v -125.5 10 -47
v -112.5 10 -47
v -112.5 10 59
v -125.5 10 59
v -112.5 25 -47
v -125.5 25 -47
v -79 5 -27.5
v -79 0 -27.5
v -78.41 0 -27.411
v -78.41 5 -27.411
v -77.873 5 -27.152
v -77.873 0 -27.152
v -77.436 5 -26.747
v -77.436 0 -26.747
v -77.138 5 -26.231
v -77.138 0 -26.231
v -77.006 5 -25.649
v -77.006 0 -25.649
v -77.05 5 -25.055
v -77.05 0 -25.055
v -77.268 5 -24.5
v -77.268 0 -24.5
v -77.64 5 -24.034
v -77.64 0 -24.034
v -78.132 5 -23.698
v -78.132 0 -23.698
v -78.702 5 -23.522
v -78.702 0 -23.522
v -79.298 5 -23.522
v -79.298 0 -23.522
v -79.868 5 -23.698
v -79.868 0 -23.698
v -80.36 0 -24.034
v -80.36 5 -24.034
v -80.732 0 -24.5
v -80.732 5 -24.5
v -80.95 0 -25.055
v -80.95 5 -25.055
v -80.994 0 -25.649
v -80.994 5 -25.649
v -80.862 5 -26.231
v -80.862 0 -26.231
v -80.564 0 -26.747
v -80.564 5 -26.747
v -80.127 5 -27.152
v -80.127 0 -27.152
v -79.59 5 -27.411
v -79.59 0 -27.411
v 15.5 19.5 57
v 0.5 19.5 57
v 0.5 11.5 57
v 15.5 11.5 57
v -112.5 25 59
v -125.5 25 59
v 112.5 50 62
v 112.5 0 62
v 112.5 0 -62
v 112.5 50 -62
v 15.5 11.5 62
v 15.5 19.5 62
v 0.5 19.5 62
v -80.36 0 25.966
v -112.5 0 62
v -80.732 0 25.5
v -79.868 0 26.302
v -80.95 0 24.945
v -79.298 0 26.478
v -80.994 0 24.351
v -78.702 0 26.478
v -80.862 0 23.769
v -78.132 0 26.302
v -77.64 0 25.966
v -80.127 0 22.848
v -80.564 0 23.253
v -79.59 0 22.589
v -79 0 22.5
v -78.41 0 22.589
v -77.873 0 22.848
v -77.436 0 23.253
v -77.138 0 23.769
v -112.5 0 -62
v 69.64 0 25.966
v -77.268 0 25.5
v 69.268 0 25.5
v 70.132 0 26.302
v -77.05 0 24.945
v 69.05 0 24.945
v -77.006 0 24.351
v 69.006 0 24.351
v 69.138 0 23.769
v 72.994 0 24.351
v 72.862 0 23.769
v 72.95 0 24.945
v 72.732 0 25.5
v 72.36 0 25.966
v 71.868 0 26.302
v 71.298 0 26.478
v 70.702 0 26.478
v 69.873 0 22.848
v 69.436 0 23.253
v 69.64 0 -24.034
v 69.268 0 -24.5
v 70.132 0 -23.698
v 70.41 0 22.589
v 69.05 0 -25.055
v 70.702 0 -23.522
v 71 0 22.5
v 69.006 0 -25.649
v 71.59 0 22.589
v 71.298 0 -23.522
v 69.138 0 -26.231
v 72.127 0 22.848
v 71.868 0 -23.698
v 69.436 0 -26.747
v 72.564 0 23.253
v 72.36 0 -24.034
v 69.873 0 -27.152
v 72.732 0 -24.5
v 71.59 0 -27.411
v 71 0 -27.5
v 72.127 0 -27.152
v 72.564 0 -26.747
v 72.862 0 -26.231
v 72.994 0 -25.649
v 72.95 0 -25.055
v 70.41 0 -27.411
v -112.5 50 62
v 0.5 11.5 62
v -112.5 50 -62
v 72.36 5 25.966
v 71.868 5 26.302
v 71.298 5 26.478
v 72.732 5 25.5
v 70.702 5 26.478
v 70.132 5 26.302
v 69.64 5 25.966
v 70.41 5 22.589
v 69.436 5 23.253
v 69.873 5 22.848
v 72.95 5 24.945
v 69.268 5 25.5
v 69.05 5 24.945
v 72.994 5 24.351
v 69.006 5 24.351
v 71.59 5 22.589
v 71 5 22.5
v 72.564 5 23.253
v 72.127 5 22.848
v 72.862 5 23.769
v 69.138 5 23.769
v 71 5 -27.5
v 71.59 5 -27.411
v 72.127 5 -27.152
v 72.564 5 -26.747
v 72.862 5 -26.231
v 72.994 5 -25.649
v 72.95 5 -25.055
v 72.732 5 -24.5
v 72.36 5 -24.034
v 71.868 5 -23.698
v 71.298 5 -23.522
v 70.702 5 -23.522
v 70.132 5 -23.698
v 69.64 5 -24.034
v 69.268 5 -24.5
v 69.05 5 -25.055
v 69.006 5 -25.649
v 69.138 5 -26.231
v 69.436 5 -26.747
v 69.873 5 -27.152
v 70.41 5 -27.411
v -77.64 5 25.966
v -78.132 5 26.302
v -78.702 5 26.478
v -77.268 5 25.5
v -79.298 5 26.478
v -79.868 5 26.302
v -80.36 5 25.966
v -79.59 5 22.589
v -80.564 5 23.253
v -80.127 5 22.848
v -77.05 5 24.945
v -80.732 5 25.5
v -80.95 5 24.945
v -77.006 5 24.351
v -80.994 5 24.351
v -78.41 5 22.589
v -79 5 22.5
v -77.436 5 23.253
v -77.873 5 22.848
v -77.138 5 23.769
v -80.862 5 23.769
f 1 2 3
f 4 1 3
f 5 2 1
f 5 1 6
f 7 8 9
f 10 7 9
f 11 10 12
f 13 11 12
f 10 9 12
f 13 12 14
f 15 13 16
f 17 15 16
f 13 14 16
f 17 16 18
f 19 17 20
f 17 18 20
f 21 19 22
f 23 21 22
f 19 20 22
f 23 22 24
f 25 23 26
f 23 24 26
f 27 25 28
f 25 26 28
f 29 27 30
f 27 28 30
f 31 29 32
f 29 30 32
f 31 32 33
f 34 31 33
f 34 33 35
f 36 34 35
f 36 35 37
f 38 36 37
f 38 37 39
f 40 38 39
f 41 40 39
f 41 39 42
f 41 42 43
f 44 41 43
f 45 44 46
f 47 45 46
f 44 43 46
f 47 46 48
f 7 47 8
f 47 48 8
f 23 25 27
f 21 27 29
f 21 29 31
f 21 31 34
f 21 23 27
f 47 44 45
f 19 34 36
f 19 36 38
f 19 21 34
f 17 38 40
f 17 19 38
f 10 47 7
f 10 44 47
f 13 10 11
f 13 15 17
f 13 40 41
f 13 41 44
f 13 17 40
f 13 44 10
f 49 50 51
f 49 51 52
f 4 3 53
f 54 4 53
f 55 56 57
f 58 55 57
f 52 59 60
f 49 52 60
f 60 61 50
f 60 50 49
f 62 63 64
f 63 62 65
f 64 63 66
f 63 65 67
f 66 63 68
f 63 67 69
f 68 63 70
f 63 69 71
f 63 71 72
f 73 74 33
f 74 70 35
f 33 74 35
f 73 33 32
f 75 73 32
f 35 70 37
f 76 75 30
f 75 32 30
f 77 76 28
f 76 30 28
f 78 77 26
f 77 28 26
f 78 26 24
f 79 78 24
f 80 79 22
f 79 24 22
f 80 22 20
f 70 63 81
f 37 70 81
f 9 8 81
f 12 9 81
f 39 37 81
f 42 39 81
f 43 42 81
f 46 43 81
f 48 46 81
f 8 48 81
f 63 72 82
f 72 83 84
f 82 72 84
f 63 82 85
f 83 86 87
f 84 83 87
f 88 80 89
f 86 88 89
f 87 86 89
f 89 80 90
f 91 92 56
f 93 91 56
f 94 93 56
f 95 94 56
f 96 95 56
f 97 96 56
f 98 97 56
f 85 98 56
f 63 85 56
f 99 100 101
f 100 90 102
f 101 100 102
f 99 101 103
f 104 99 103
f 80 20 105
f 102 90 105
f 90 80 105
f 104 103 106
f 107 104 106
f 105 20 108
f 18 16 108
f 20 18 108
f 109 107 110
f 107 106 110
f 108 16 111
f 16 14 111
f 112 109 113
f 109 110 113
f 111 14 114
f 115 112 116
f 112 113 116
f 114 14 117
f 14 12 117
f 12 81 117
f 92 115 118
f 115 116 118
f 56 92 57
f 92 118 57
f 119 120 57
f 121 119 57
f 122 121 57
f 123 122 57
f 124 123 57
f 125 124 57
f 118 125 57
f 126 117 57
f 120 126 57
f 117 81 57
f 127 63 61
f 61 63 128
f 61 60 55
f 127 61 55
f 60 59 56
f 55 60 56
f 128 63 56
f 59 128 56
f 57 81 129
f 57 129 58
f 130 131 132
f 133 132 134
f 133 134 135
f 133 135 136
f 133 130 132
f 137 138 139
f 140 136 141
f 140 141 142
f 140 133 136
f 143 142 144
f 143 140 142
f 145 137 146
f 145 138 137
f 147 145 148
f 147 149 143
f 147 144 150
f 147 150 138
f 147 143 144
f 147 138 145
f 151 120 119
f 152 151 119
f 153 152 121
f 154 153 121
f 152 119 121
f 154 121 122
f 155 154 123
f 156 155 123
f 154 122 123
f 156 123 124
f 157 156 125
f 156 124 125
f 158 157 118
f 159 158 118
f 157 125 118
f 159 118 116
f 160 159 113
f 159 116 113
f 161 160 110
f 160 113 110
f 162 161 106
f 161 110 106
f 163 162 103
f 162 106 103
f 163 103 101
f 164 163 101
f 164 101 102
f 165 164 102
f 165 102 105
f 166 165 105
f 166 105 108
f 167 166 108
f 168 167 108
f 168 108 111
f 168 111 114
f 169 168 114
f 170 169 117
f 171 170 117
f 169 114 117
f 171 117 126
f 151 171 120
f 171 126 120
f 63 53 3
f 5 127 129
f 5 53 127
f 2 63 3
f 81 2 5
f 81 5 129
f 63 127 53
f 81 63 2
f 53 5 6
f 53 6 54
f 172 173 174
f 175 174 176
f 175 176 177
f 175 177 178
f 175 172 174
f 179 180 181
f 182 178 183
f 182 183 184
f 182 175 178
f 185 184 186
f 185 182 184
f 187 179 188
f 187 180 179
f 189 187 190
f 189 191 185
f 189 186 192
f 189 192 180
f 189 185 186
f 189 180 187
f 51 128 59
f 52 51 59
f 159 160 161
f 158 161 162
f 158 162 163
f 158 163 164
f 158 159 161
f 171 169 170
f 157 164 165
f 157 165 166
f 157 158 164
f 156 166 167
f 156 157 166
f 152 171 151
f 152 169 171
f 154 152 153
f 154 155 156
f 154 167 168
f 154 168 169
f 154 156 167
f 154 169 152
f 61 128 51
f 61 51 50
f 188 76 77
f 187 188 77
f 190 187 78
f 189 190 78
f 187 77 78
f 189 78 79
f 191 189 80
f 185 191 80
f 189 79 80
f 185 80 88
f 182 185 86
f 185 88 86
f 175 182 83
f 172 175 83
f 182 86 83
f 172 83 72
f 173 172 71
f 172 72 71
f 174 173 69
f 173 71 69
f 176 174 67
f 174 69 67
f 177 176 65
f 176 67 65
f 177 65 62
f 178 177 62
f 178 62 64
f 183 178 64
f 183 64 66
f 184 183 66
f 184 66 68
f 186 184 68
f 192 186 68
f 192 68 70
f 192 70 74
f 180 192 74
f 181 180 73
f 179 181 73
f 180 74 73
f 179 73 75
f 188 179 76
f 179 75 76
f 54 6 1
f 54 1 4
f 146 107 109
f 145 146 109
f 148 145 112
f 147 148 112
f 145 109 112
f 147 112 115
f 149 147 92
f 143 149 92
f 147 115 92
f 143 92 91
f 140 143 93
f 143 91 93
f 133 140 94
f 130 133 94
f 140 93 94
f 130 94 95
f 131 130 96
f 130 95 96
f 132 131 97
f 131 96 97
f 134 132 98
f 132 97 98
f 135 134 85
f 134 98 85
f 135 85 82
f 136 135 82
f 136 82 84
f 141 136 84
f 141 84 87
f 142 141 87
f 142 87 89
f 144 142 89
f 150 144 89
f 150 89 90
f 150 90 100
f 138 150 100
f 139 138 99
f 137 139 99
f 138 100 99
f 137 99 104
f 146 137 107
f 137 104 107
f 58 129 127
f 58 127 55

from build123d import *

# Parameters (mm, degrees)
SKETCH1_W           = 225
SKETCH1_H           = 124
BOSS_EXTRUDE1_DEPTH = 50
SKETCH3_R           = 2
CUT_EXTRUDE2_DEPTH  = 5
SKETCH4_W           = 15
SKETCH4_H           = 8
CUT_EXTRUDE3_DEPTH  = 5
SKETCH5_W           = 106
SKETCH5_H           = 15
BOSS_EXTRUDE2_DEPTH = 13


with BuildPart() as part:
    # Sketch1 → Boss-Extrude1 (new body)
    with BuildSketch(Plane(origin=(0, 0, 0), x_dir=(1, 0, 0), z_dir=(0, 1, 0))):
        Rectangle(SKETCH1_W, SKETCH1_H)
    extrude(amount=BOSS_EXTRUDE1_DEPTH)

    # Sketch3 → Cut-Extrude2 (cut)
    with BuildSketch(Plane.XZ):
        with Locations(Location((-79, -25.5, 0), (0, 0, 270))):  # turned: the seam where the file's is
            Circle(SKETCH3_R)
        with Locations(Location((-79, 24.5, 0), (0, 0, 270))):  # turned: the seam where the file's is
            Circle(SKETCH3_R)
        with Locations(Location((71, -25.5, 0), (0, 0, 270))):  # turned: the seam where the file's is
            Circle(SKETCH3_R)
        with Locations(Location((71, 24.5, 0), (0, 0, 270))):  # turned: the seam where the file's is
            Circle(SKETCH3_R)
    extrude(amount=-CUT_EXTRUDE2_DEPTH, mode=Mode.SUBTRACT)

    # Sketch4 → Cut-Extrude3 (cut)
    with BuildSketch(Plane.XY.offset(62)):
        with Locations((8, 15.5)):
            Rectangle(SKETCH4_W, SKETCH4_H)
    extrude(amount=-CUT_EXTRUDE3_DEPTH, mode=Mode.SUBTRACT)

    # Sketch5 → Boss-Extrude2 (add)
    with BuildSketch(Plane.ZY.offset(112.5)):
        with Locations((6, 17.5)):
            Rectangle(SKETCH5_W, SKETCH5_H)
    extrude(amount=BOSS_EXTRUDE2_DEPTH)


solid = part.part
